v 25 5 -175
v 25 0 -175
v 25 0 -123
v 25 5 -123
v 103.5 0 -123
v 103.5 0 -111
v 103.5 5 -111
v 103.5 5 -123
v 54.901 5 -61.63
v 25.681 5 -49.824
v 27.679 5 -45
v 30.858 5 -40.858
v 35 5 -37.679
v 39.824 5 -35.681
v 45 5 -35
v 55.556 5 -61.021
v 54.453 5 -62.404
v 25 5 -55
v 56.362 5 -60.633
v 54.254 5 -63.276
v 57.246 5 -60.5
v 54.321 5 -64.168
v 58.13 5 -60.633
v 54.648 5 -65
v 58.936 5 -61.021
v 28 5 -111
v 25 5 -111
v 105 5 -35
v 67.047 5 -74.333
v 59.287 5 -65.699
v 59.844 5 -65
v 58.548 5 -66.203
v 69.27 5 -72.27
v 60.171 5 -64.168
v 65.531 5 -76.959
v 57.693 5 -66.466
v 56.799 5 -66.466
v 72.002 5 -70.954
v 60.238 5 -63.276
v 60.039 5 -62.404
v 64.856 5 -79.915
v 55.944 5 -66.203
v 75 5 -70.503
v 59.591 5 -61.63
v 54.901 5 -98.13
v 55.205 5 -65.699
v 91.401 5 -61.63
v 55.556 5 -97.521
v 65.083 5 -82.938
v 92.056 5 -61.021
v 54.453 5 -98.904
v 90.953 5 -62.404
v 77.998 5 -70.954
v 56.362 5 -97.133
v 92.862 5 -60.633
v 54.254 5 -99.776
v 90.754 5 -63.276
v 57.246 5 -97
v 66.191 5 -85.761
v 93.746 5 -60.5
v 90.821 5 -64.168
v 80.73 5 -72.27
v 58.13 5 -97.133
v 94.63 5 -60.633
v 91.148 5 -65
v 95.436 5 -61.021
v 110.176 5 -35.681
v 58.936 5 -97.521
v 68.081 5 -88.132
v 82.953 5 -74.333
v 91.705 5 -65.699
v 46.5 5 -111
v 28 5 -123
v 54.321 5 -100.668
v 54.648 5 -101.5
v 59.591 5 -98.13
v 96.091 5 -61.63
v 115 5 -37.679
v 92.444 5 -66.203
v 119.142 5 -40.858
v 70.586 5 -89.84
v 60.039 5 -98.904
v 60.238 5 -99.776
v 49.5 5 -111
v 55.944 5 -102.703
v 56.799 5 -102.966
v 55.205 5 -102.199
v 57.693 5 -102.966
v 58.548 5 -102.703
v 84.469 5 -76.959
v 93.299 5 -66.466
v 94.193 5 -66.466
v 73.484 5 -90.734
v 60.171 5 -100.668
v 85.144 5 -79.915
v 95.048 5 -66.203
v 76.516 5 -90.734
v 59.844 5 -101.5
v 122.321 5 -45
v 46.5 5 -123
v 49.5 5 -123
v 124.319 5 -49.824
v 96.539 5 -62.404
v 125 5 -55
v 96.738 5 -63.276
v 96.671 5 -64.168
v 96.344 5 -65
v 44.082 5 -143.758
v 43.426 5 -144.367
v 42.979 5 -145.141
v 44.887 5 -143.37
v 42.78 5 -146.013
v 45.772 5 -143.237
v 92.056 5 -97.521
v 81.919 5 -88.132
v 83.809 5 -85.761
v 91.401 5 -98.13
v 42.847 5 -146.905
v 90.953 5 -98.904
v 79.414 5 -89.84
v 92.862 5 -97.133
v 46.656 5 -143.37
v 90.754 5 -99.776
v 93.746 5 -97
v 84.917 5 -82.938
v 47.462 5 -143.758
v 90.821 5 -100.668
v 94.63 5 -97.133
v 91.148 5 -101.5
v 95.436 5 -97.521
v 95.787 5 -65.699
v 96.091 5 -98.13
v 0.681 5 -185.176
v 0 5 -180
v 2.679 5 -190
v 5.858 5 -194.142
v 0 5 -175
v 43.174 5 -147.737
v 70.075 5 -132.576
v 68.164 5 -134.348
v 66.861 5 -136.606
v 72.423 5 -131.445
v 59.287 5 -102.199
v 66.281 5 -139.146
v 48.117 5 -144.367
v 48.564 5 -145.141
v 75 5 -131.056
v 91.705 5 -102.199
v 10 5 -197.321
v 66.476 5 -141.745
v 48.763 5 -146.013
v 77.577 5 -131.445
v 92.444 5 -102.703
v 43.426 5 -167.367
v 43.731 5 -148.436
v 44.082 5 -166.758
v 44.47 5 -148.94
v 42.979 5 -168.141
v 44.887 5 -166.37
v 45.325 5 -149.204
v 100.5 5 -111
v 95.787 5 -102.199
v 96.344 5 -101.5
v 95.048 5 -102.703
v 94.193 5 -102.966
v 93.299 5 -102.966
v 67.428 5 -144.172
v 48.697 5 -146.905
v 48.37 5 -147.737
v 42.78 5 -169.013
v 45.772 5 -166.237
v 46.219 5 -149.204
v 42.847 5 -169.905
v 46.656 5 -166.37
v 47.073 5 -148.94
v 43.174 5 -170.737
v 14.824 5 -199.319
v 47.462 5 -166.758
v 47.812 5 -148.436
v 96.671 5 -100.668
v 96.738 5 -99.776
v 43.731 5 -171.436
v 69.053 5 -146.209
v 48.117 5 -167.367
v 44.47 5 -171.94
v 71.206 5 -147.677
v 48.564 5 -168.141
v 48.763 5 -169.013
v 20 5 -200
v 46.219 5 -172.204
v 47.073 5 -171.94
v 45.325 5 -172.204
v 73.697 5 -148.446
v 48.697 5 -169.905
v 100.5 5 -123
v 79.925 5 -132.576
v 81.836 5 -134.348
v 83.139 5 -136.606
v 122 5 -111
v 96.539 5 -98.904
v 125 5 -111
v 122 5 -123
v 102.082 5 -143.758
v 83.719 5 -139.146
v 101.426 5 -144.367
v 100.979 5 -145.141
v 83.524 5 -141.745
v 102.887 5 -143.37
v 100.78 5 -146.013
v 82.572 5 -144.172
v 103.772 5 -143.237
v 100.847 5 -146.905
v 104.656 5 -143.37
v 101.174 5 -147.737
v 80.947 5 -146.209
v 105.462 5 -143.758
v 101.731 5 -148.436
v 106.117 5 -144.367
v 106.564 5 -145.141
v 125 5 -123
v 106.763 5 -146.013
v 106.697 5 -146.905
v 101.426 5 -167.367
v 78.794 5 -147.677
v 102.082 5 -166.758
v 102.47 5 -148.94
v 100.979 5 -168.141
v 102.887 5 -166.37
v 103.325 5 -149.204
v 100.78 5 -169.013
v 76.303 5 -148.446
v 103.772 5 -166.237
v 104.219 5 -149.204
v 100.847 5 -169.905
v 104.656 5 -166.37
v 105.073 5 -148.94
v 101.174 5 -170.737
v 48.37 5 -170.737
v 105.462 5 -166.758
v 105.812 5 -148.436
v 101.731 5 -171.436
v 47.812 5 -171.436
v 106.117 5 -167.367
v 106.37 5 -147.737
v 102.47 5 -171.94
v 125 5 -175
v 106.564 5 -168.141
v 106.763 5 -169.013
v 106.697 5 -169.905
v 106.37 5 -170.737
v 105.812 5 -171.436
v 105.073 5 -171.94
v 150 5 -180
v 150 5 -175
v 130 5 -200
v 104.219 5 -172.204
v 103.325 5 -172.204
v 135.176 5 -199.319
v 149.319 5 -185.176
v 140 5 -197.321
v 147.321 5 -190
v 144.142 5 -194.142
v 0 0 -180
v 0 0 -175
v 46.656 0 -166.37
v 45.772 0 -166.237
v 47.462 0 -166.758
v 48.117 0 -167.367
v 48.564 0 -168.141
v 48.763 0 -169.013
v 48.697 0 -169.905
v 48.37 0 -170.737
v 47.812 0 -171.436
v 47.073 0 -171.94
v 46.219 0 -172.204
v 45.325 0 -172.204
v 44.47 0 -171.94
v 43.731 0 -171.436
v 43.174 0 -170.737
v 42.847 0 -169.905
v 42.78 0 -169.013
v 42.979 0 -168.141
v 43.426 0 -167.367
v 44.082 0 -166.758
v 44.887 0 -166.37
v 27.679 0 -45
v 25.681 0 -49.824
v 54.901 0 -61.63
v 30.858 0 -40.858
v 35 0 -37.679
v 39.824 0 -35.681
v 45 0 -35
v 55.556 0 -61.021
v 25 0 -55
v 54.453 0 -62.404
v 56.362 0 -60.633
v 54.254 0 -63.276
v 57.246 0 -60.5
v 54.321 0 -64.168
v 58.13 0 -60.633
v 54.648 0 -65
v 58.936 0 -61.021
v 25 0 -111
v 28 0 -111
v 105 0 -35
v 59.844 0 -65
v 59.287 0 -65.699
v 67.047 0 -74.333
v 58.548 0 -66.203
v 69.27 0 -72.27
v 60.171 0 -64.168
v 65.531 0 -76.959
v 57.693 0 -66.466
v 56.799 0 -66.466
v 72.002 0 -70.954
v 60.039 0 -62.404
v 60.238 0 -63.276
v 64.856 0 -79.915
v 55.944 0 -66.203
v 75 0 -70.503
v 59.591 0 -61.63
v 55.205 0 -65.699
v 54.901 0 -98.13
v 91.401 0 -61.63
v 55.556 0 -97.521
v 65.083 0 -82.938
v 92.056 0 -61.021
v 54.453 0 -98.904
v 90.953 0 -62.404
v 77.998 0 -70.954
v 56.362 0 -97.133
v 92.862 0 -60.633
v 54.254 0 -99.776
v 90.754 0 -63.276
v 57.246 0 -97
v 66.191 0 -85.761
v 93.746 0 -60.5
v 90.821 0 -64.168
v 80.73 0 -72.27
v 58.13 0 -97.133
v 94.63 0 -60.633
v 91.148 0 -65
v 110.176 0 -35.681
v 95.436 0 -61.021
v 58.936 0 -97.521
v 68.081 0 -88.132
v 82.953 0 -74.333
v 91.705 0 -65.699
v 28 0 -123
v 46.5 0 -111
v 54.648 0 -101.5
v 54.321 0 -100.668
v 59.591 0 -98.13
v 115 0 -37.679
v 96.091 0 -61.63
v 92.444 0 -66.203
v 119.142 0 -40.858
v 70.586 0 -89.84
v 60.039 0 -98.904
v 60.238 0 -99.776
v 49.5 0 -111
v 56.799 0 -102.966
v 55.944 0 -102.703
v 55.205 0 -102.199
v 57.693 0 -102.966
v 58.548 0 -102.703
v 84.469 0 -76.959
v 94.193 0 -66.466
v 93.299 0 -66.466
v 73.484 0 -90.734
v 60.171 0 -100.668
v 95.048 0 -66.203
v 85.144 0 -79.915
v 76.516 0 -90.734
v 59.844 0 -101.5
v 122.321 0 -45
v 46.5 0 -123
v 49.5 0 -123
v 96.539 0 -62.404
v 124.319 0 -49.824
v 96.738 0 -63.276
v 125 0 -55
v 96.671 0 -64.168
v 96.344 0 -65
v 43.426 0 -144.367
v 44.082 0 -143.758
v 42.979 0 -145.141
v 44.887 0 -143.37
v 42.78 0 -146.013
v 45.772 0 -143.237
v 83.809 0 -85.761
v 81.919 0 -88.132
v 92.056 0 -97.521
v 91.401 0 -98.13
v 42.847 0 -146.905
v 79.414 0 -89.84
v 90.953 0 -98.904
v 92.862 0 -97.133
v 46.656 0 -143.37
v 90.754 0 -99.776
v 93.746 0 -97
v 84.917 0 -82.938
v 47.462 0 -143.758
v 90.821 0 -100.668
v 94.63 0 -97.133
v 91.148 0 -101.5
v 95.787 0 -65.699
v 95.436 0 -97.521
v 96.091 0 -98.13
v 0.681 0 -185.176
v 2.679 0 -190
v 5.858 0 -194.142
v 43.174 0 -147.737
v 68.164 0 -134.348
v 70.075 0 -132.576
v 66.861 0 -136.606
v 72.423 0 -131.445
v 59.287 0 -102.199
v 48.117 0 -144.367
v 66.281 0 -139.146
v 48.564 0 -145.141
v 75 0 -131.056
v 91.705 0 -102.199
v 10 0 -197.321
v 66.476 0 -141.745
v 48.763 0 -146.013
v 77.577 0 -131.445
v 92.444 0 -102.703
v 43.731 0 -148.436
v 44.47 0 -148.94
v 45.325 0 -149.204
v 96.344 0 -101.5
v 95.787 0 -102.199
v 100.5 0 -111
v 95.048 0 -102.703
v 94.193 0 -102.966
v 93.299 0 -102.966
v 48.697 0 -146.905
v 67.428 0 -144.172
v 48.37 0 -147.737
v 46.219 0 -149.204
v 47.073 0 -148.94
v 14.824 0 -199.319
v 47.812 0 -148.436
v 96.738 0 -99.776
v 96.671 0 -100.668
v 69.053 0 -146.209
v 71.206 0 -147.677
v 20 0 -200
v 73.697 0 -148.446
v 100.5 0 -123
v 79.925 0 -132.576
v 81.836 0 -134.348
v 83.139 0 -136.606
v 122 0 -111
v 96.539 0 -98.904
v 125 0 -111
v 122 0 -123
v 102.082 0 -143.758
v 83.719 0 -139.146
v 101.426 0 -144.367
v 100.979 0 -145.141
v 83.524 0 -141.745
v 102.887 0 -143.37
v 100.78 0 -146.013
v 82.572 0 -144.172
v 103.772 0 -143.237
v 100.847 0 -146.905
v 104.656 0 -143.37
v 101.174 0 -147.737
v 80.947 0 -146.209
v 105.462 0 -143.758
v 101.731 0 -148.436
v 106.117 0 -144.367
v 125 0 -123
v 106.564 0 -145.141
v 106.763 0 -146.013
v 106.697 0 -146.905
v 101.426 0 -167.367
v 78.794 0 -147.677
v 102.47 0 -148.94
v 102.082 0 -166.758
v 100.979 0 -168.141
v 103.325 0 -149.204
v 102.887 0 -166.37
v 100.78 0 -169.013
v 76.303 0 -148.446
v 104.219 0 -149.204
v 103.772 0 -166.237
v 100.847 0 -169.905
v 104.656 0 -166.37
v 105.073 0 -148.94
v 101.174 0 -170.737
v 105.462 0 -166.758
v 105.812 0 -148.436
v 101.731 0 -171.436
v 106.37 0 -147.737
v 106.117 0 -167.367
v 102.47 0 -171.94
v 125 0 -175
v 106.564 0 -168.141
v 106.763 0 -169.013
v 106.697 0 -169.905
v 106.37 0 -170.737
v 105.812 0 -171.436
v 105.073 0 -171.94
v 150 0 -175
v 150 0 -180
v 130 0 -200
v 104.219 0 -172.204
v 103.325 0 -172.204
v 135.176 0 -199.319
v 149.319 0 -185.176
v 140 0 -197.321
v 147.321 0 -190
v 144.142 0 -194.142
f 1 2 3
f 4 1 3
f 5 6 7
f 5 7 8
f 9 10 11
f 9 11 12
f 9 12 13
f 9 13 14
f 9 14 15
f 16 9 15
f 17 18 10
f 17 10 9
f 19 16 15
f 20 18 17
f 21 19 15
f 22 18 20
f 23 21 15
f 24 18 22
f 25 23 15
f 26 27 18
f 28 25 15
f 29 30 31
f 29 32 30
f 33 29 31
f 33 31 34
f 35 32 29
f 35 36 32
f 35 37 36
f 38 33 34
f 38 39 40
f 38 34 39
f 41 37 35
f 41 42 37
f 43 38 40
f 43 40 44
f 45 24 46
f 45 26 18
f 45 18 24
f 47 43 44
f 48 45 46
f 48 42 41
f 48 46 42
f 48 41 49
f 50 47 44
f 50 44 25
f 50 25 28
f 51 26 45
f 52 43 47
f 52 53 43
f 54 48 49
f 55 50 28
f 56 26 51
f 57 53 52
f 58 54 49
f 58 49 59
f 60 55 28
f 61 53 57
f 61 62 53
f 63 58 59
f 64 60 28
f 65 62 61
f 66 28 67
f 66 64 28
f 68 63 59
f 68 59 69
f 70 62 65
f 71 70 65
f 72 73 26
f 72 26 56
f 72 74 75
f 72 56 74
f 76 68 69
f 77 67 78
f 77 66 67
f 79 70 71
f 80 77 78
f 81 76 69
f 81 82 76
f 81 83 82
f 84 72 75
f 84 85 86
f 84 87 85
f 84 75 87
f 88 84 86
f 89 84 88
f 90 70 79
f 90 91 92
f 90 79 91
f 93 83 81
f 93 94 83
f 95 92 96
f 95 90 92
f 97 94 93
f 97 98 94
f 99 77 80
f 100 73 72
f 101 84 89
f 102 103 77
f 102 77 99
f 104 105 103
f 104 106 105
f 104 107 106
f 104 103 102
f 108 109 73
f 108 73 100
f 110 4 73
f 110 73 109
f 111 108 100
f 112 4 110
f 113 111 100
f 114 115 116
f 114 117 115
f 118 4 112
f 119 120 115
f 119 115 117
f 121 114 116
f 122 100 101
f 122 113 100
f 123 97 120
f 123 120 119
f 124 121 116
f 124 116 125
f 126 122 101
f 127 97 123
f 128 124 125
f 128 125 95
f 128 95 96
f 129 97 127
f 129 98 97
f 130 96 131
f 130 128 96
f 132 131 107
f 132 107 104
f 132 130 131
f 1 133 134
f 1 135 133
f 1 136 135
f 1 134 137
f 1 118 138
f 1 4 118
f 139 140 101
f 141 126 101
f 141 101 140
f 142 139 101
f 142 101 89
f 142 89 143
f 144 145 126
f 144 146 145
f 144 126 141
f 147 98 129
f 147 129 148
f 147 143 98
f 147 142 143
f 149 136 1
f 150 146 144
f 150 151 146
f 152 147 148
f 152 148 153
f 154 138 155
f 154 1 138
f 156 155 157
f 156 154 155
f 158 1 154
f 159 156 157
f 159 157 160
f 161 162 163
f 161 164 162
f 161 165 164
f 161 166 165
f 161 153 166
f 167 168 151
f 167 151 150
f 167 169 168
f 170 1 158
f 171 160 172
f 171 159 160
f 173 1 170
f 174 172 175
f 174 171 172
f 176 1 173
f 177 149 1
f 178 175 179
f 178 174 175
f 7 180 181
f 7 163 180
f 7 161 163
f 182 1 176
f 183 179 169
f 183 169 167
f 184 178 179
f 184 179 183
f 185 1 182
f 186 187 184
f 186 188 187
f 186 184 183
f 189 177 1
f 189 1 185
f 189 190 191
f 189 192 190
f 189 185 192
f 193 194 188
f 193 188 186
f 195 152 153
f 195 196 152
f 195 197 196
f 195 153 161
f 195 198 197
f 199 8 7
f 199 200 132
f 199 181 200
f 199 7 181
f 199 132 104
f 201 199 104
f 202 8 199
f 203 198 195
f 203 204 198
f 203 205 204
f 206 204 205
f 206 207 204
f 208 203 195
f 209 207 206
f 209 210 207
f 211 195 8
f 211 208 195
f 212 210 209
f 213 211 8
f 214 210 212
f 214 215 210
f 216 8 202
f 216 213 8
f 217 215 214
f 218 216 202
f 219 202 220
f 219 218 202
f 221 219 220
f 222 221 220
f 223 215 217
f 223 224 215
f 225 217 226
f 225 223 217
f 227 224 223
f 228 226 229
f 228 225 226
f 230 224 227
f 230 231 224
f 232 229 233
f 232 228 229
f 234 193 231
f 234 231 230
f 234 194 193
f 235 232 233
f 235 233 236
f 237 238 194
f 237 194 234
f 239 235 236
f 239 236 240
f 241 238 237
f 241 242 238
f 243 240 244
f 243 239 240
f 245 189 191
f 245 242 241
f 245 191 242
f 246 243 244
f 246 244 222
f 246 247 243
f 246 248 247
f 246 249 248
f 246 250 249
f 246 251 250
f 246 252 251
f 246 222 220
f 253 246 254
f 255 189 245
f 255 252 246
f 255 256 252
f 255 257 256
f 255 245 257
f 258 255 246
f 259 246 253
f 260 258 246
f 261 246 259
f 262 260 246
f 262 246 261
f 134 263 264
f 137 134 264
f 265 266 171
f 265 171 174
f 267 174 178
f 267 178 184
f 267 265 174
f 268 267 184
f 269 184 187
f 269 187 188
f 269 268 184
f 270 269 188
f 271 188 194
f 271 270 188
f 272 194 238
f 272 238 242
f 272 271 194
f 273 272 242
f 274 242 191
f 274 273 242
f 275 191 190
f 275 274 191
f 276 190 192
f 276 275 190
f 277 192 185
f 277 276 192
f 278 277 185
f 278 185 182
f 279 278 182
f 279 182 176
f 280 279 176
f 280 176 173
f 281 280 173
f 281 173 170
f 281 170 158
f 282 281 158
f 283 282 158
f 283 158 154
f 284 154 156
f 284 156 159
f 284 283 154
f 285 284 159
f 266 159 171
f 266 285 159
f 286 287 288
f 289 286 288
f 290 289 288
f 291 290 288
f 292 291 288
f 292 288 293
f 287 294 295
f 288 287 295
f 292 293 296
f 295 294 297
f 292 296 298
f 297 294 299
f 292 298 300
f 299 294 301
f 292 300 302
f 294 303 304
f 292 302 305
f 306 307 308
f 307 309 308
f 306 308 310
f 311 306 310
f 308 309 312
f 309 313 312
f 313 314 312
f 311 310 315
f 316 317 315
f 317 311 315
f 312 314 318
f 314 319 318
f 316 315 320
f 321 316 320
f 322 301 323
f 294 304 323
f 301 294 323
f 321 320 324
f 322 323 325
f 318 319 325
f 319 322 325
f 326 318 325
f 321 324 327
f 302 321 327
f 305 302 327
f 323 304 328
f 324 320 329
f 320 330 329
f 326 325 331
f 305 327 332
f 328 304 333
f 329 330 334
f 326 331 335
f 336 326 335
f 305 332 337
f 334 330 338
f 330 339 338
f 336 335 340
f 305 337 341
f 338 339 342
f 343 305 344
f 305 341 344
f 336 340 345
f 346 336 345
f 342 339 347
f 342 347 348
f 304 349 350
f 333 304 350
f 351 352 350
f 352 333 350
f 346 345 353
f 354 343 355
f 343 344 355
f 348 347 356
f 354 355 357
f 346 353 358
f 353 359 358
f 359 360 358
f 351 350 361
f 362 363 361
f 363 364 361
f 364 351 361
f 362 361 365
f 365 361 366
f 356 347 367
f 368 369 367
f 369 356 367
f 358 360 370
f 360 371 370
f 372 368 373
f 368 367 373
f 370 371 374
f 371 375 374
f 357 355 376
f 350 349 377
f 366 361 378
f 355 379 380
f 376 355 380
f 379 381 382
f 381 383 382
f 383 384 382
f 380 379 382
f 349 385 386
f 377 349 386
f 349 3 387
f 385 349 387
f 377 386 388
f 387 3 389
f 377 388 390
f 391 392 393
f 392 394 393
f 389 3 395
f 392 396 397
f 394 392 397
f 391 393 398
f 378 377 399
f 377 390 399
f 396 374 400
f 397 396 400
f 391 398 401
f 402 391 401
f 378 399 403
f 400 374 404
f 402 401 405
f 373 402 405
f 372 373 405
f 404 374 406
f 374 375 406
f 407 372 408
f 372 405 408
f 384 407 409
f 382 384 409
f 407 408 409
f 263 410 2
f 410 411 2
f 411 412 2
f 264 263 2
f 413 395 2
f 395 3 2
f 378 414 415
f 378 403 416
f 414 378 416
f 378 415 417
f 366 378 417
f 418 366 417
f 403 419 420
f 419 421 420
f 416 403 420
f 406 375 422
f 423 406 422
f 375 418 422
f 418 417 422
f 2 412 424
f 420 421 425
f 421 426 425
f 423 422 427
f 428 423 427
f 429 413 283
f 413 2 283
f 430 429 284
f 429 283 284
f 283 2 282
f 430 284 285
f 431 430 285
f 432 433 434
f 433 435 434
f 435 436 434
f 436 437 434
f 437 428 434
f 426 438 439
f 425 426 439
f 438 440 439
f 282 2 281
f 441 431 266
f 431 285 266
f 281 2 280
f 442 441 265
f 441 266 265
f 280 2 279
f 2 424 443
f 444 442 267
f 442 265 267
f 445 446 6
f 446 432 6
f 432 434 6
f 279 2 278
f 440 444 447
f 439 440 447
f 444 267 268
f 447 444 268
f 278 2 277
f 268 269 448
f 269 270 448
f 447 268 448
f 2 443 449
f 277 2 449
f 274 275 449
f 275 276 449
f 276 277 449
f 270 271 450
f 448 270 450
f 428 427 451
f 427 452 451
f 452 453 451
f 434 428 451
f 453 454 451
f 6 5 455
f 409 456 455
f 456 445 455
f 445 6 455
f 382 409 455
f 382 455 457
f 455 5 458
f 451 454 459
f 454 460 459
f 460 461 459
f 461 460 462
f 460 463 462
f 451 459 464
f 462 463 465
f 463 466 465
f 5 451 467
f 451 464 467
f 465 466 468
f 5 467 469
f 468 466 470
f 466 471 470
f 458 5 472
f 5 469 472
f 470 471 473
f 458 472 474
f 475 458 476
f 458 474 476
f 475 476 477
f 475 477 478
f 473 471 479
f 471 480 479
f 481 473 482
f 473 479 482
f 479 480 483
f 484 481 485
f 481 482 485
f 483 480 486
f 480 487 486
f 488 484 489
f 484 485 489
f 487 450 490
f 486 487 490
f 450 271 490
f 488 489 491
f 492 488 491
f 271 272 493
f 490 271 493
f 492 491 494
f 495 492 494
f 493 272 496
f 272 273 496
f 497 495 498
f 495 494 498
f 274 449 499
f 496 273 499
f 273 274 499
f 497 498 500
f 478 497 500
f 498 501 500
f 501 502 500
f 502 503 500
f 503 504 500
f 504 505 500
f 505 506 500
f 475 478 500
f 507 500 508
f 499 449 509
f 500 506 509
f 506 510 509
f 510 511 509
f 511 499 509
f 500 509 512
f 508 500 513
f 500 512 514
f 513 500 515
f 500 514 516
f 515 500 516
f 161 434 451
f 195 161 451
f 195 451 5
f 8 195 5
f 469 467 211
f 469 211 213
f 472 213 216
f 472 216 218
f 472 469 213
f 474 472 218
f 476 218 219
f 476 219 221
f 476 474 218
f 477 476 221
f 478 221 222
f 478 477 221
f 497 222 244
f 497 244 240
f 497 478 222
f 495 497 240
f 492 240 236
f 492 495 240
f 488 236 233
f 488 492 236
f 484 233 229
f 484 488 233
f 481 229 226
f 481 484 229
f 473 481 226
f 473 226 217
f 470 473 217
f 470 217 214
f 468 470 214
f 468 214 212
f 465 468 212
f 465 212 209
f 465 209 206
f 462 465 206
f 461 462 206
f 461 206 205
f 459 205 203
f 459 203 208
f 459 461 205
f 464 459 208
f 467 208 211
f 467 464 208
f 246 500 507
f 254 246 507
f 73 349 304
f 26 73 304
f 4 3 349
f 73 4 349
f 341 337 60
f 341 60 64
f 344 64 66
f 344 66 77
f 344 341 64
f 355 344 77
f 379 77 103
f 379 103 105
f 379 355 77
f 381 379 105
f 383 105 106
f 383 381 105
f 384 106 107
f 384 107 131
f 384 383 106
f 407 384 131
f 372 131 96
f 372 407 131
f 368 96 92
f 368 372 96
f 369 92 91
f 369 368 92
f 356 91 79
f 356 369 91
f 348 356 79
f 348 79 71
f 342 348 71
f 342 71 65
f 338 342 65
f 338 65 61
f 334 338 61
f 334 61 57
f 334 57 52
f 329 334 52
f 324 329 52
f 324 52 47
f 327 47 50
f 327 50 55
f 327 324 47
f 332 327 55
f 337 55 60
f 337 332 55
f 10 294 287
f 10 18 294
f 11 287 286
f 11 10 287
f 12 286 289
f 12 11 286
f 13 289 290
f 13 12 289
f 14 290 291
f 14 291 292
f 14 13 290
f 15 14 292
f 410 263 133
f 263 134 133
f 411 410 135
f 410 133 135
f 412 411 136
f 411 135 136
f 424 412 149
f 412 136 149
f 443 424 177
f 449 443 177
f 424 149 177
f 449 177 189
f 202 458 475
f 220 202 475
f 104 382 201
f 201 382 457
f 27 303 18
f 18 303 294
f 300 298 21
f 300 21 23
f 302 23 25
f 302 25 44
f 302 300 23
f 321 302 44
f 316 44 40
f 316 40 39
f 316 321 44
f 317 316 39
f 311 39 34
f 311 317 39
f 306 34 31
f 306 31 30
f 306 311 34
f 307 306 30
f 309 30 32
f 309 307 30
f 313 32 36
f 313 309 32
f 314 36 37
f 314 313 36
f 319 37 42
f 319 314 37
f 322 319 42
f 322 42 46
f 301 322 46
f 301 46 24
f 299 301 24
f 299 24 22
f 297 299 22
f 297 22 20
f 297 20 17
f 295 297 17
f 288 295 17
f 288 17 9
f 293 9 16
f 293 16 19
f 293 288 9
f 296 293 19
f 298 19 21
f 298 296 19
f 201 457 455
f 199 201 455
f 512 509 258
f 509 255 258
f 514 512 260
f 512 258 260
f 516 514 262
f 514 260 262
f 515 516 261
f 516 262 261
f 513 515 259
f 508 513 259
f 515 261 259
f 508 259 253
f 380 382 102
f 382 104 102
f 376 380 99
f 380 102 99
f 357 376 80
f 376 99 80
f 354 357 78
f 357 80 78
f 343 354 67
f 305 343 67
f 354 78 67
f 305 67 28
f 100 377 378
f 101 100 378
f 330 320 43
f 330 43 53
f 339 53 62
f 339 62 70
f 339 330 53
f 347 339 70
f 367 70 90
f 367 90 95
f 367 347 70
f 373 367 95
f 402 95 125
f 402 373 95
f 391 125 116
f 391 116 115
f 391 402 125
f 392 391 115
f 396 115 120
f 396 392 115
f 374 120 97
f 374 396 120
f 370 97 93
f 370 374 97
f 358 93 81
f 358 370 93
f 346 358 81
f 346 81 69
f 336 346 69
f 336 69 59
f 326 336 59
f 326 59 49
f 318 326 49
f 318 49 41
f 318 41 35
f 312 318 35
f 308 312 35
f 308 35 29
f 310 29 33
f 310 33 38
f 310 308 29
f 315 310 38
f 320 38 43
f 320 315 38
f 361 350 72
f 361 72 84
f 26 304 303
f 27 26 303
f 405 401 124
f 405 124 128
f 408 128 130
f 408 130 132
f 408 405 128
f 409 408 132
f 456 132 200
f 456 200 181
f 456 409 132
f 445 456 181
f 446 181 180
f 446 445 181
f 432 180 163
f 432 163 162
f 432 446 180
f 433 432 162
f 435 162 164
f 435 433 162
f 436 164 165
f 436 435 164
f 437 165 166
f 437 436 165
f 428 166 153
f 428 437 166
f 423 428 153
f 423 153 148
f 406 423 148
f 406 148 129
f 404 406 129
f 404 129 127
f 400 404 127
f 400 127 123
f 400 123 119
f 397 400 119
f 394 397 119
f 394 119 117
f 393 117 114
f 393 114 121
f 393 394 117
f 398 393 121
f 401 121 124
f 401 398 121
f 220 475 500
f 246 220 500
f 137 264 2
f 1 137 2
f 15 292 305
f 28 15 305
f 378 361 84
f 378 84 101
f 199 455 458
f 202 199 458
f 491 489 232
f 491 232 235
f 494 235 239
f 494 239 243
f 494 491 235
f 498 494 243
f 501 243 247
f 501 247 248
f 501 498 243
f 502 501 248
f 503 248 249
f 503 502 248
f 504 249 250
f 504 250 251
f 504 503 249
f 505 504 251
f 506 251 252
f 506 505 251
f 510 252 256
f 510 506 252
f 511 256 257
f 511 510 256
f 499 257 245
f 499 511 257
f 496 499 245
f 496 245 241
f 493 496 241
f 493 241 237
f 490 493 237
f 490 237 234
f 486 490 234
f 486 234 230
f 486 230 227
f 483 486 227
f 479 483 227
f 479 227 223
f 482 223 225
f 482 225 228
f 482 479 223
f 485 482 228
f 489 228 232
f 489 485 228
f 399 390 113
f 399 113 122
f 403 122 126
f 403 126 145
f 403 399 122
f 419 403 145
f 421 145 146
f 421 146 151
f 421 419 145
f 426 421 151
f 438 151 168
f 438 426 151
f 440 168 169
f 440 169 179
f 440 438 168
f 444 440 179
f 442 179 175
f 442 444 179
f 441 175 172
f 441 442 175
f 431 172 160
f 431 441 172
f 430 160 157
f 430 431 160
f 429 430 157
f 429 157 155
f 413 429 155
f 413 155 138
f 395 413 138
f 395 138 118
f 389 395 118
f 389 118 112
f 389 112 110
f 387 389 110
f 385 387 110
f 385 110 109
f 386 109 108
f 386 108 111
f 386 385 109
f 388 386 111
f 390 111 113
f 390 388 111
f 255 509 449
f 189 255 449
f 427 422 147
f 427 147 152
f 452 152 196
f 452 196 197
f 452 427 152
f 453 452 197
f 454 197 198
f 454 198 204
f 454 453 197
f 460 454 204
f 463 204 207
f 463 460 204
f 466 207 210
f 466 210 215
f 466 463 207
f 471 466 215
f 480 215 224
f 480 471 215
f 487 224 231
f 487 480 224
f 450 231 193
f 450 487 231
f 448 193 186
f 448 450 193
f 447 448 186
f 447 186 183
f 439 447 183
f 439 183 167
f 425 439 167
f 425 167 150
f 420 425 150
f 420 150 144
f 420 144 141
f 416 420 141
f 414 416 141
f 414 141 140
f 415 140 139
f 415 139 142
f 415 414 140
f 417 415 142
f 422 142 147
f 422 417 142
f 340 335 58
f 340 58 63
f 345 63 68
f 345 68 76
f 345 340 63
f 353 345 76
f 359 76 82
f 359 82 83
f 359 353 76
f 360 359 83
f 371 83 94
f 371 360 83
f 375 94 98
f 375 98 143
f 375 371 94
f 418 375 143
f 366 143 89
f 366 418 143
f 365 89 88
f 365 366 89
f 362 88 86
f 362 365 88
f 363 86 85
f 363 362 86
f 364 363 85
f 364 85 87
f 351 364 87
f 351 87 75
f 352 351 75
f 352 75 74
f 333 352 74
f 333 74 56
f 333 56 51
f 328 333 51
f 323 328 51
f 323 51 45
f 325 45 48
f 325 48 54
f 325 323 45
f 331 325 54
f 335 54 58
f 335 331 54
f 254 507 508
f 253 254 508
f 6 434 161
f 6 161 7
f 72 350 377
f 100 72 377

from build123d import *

# Parameters (mm, degrees)
SKETCH1_R           = 8.743447226
SKETCH1_R_2         = 3
SKETCH1_R_3         = 10.172294787
SKETCH1_W           = 3
SKETCH1_H           = 12
BOSS_EXTRUDE1_DEPTH = 5
FILLET3_R           = 20
FILLET4_R           = 20
FILLET5_R           = 20


with BuildPart() as part:
    # Sketch1 → Boss-Extrude1 (new body)
    with BuildSketch(Plane(origin=(0, 0, 0), x_dir=(1, 0, 0), z_dir=(0, 1, 0))):
        Polygon((25, 35), (125, 35), (125, 111), (122, 111), (122, 123), (125, 123), (125, 175), (150, 175), (150, 200), (0, 200), (0, 175), (25, 175), (25, 123), (28, 123), (28, 111), (25, 111), align=None)
        with Locations(Location((75, 139.799864951, 0), (0, 0, 270))):
            Circle(SKETCH1_R, mode=Mode.SUBTRACT)
        with Locations(Location((93.745998674, 100, 0), (0, 0, 270))):
            Circle(SKETCH1_R_2, mode=Mode.SUBTRACT)
        with Locations(Location((93.745998674, 63.5, 0), (0, 0, 270))):
            Circle(SKETCH1_R_2, mode=Mode.SUBTRACT)
        with Locations(Location((75, 80.674864151, 0), (0, 0, 270))):
            Circle(SKETCH1_R_3, mode=Mode.SUBTRACT)
        with Locations(Location((57.245998674, 63.5, 0), (0, 0, 270))):
            Circle(SKETCH1_R_2, mode=Mode.SUBTRACT)
        with Locations(Location((57.245998674, 100, 0), (0, 0, 270))):
            Circle(SKETCH1_R_2, mode=Mode.SUBTRACT)
        with Locations((48, 117)):
            Rectangle(SKETCH1_W, SKETCH1_H, mode=Mode.SUBTRACT)
        with Locations(Location((45.771721368, 146.237160755, 0), (0, 0, 270))):
            Circle(SKETCH1_R_2, mode=Mode.SUBTRACT)
        with Locations(Location((45.771721368, 169.237160755, 0), (0, 0, 270))):
            Circle(SKETCH1_R_2, mode=Mode.SUBTRACT)
        with Locations((102, 117)):
            Rectangle(SKETCH1_W, SKETCH1_H, mode=Mode.SUBTRACT)
        with Locations(Location((103.771721368, 146.237160755, 0), (0, 0, 270))):
            Circle(SKETCH1_R_2, mode=Mode.SUBTRACT)
        with Locations(Location((103.771721368, 169.237160755, 0), (0, 0, 270))):
            Circle(SKETCH1_R_2, mode=Mode.SUBTRACT)
    extrude(amount=BOSS_EXTRUDE1_DEPTH)

    # Fillet3
    fillet3_edges = [part.edges().sort_by_distance(p)[0] for p in [
        (0, 2.5, -200),
    ]]
    fillet(fillet3_edges, radius=FILLET3_R)

    # Fillet4
    fillet4_edges = [part.edges().sort_by_distance(p)[0] for p in [
        (150, 2.5, -200),
    ]]
    fillet(fillet4_edges, radius=FILLET4_R)

    # Fillet5
    fillet5_edges = [part.edges().sort_by_distance(p)[0] for p in [
        (125, 2.5, -35),
        (25, 2.5, -35),
    ]]
    fillet(fillet5_edges, radius=FILLET5_R)


solid = part.part
